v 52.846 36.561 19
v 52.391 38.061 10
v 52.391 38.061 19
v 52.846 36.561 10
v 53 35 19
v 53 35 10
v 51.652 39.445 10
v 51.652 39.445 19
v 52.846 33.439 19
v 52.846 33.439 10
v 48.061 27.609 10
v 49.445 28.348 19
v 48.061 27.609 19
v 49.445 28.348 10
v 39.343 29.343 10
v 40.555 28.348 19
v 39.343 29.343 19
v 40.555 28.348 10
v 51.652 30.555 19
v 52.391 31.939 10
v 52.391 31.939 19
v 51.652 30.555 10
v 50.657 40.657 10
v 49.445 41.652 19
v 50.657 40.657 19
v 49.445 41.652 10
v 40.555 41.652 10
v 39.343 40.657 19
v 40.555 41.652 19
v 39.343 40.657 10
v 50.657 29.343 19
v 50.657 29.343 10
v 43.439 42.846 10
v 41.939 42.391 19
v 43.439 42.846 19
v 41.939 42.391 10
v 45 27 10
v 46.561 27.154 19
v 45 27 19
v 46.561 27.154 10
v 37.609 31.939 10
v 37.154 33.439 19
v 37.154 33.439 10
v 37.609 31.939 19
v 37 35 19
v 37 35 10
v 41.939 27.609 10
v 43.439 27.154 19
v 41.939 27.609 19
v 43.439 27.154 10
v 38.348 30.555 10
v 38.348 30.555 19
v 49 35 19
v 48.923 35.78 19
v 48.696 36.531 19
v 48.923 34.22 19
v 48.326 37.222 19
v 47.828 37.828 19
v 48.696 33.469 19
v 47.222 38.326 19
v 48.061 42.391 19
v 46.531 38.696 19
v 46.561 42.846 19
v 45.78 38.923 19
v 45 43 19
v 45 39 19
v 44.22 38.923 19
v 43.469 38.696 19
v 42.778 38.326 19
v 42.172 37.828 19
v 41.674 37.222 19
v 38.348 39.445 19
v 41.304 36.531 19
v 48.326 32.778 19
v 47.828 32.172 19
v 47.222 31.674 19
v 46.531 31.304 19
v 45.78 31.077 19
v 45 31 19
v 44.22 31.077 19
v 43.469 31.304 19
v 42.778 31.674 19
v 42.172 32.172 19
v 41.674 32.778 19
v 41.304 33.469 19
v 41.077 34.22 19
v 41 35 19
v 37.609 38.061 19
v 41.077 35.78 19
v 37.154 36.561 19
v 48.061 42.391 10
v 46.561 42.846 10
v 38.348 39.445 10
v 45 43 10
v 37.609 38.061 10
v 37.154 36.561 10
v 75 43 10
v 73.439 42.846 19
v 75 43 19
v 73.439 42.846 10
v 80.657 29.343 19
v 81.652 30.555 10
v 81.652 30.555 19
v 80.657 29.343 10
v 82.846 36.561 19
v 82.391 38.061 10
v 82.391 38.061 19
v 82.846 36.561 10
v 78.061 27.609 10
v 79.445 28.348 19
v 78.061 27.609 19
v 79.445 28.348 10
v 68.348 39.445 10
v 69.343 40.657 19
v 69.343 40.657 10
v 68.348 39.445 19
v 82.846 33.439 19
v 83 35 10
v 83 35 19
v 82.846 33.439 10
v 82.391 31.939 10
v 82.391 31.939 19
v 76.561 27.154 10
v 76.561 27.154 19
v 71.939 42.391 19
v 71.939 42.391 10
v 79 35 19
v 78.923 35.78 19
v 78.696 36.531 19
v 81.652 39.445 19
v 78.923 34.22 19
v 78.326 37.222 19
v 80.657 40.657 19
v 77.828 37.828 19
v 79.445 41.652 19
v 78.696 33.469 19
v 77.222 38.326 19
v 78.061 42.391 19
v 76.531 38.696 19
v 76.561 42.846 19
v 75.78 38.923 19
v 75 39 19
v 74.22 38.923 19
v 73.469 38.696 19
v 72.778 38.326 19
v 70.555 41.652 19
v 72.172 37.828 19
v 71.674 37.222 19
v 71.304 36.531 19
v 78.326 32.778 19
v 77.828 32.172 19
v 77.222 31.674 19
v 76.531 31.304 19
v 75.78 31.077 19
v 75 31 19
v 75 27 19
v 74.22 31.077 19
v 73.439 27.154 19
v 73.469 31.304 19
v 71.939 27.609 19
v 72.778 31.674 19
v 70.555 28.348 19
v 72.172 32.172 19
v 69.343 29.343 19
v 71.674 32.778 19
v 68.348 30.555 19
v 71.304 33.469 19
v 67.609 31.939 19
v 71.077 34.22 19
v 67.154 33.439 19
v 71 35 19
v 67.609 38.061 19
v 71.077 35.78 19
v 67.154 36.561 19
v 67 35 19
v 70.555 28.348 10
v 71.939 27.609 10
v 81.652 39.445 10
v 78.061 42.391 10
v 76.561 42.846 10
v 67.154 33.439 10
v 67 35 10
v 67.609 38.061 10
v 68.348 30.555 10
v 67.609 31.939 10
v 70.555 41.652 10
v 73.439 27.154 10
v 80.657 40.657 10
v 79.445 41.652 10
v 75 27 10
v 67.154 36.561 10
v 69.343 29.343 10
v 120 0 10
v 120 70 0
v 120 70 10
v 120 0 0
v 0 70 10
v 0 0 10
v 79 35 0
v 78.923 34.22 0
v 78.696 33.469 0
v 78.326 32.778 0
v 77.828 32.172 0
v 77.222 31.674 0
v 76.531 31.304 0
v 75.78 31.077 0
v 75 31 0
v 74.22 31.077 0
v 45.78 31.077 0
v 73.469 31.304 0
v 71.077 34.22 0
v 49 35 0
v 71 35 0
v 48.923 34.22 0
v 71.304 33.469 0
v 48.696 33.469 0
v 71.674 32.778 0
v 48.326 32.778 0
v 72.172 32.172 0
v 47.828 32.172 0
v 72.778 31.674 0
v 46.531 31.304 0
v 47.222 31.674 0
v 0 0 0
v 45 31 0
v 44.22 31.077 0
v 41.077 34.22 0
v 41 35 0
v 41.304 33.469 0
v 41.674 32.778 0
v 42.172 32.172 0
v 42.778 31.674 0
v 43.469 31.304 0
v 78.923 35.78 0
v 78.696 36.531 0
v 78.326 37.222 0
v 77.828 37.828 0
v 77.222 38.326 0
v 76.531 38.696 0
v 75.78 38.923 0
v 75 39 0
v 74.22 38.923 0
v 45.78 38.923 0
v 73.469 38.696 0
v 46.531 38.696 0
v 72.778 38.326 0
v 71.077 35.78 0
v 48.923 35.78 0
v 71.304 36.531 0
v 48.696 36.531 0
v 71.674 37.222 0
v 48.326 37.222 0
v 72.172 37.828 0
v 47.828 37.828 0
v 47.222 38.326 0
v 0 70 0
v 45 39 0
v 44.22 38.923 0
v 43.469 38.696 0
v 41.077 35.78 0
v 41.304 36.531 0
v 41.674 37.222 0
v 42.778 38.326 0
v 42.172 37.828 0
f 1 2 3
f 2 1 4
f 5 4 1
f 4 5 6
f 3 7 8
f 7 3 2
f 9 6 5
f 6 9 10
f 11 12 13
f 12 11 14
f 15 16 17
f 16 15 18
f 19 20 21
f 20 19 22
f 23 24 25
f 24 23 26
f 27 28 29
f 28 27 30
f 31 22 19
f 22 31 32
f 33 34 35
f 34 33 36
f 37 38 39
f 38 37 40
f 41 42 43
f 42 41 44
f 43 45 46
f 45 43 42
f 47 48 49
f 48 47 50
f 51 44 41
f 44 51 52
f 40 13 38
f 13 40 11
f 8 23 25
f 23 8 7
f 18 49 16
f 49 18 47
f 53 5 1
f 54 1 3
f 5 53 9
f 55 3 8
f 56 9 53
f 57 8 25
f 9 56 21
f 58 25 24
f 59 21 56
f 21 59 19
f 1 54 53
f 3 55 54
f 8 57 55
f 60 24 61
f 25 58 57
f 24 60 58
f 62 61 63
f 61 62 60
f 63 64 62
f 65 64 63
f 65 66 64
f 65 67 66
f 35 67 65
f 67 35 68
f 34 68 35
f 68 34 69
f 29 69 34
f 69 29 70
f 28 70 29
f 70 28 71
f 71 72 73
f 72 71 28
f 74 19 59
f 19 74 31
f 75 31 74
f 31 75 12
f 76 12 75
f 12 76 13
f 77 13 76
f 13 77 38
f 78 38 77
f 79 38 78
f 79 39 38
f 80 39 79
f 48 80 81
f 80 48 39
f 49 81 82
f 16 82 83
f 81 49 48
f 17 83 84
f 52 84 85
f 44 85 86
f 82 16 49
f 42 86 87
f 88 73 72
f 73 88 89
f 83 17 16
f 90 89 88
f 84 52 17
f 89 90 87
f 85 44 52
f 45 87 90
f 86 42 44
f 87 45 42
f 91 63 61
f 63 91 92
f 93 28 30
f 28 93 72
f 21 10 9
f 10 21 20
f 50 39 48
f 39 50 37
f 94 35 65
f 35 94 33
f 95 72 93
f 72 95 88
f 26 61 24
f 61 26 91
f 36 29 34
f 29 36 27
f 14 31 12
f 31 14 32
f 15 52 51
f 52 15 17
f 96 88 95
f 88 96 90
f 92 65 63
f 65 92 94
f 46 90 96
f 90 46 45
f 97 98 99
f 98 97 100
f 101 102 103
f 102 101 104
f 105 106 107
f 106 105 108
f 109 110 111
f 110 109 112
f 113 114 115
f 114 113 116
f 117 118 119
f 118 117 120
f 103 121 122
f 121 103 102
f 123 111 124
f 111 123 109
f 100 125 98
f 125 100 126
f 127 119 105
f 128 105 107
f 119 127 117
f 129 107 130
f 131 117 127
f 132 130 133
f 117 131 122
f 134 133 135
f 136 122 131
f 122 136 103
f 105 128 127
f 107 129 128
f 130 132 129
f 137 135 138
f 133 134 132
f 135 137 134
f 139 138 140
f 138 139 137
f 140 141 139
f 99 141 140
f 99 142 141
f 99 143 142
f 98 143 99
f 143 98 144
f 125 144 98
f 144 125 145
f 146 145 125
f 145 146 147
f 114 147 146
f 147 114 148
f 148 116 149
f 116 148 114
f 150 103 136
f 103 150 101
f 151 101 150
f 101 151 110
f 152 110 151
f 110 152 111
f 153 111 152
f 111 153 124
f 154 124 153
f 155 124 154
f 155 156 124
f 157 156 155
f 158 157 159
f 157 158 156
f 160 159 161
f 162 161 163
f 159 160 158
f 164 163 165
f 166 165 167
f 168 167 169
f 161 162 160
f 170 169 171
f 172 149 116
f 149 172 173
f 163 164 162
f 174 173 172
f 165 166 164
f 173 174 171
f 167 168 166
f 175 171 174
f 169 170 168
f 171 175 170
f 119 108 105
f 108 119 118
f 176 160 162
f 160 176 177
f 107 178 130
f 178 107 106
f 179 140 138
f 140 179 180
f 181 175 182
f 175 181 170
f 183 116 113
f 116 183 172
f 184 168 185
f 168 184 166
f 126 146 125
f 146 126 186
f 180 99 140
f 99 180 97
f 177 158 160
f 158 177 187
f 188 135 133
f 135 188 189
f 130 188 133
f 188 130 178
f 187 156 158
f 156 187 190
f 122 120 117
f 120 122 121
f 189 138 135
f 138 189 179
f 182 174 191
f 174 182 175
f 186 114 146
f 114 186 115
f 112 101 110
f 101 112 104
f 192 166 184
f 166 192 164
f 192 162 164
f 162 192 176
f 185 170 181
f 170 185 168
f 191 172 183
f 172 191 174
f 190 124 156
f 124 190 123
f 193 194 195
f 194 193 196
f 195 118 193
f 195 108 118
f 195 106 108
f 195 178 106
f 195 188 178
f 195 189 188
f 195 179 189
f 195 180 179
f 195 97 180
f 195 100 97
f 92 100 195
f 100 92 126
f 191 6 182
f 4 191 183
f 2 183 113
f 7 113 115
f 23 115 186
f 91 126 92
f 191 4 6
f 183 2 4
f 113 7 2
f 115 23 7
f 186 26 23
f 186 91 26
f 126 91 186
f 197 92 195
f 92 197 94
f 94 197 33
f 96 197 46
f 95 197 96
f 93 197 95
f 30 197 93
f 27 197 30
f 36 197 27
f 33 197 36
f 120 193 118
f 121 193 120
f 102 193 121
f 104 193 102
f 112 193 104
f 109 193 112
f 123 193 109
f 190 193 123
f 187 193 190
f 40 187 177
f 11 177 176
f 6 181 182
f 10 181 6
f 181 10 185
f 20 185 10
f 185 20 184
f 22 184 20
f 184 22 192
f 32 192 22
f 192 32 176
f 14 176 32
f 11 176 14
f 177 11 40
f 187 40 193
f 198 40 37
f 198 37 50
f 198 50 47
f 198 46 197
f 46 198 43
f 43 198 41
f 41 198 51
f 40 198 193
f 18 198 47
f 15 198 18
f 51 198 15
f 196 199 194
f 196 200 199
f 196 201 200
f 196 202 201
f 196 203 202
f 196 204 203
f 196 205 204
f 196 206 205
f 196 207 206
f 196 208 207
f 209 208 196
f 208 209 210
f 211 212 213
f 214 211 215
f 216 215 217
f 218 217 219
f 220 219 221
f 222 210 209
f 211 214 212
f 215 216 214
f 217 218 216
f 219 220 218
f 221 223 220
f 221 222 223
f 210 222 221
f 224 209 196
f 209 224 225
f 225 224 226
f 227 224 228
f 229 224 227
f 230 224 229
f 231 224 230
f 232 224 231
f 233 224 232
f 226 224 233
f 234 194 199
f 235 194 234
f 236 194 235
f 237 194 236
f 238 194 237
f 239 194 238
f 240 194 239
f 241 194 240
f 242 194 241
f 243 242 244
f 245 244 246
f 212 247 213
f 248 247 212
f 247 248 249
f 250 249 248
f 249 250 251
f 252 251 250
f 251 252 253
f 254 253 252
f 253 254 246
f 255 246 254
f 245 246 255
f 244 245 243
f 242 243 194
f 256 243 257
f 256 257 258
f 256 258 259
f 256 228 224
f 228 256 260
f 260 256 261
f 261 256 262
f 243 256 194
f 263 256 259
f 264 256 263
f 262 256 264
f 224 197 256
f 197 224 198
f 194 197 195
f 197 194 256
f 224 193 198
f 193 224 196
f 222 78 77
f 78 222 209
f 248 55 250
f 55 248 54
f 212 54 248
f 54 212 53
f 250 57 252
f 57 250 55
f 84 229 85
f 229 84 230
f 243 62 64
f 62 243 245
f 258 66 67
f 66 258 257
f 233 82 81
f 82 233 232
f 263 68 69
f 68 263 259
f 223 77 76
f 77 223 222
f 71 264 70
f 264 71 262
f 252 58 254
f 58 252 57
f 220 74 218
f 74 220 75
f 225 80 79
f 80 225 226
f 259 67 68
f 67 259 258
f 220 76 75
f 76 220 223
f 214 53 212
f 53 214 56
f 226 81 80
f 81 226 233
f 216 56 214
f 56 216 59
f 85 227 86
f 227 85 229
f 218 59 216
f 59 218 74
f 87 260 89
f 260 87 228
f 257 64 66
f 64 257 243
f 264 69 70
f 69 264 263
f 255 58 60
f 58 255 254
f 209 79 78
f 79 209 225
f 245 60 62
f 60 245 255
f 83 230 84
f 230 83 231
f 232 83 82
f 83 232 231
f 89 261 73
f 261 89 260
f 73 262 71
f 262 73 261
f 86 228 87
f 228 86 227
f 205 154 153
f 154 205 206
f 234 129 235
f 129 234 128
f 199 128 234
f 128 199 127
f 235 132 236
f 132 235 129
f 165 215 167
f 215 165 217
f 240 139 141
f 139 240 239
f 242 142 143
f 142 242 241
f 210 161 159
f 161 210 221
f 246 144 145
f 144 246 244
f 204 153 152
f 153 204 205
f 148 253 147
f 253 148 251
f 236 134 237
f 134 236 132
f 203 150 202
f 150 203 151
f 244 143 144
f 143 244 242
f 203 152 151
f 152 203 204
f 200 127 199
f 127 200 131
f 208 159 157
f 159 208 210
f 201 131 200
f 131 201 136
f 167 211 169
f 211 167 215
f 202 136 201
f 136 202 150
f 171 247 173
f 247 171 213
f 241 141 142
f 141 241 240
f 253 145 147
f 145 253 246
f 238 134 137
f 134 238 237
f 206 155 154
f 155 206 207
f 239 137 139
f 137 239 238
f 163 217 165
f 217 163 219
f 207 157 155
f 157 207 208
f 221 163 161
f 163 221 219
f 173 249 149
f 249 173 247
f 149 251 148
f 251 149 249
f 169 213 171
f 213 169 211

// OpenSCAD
$fn = 32;

// ----------------------------------------------------------------------
// Drill jig: two_boss jig
// ----------------------------------------------------------------------

// --- parameters (mm) ---
plate_l = 120;            // plate length, X
plate_w = 70;             // plate width, Y
plate_t = 10;             // plate thickness
boss_d = 16;              // guide boss diameter
boss_h = 10;              // boss height above the plate
guide_d = 8;              // guide hole diameter
boss_pitch = 30;          // boss pitch

n_boss = 2;  // guide bosses
boss_x0 = (plate_l - (n_boss - 1) * boss_pitch) / 2;  // first boss X
boss_top = plate_t - 1 + boss_h;  // boss crown height
total_h = boss_top;  // overall height

difference() {
  union() {
  cube([plate_l, plate_w, plate_t]);
  for (i = [0 : n_boss - 1])
    translate([boss_x0 + i * boss_pitch, plate_w / 2, plate_t - 1])
      cylinder(h = boss_h, d = boss_d);
  }
  for (i = [0 : n_boss - 1])
    translate([boss_x0 + i * boss_pitch, plate_w / 2, -1])
      cylinder(h = plate_t + boss_h, d = guide_d);
}
